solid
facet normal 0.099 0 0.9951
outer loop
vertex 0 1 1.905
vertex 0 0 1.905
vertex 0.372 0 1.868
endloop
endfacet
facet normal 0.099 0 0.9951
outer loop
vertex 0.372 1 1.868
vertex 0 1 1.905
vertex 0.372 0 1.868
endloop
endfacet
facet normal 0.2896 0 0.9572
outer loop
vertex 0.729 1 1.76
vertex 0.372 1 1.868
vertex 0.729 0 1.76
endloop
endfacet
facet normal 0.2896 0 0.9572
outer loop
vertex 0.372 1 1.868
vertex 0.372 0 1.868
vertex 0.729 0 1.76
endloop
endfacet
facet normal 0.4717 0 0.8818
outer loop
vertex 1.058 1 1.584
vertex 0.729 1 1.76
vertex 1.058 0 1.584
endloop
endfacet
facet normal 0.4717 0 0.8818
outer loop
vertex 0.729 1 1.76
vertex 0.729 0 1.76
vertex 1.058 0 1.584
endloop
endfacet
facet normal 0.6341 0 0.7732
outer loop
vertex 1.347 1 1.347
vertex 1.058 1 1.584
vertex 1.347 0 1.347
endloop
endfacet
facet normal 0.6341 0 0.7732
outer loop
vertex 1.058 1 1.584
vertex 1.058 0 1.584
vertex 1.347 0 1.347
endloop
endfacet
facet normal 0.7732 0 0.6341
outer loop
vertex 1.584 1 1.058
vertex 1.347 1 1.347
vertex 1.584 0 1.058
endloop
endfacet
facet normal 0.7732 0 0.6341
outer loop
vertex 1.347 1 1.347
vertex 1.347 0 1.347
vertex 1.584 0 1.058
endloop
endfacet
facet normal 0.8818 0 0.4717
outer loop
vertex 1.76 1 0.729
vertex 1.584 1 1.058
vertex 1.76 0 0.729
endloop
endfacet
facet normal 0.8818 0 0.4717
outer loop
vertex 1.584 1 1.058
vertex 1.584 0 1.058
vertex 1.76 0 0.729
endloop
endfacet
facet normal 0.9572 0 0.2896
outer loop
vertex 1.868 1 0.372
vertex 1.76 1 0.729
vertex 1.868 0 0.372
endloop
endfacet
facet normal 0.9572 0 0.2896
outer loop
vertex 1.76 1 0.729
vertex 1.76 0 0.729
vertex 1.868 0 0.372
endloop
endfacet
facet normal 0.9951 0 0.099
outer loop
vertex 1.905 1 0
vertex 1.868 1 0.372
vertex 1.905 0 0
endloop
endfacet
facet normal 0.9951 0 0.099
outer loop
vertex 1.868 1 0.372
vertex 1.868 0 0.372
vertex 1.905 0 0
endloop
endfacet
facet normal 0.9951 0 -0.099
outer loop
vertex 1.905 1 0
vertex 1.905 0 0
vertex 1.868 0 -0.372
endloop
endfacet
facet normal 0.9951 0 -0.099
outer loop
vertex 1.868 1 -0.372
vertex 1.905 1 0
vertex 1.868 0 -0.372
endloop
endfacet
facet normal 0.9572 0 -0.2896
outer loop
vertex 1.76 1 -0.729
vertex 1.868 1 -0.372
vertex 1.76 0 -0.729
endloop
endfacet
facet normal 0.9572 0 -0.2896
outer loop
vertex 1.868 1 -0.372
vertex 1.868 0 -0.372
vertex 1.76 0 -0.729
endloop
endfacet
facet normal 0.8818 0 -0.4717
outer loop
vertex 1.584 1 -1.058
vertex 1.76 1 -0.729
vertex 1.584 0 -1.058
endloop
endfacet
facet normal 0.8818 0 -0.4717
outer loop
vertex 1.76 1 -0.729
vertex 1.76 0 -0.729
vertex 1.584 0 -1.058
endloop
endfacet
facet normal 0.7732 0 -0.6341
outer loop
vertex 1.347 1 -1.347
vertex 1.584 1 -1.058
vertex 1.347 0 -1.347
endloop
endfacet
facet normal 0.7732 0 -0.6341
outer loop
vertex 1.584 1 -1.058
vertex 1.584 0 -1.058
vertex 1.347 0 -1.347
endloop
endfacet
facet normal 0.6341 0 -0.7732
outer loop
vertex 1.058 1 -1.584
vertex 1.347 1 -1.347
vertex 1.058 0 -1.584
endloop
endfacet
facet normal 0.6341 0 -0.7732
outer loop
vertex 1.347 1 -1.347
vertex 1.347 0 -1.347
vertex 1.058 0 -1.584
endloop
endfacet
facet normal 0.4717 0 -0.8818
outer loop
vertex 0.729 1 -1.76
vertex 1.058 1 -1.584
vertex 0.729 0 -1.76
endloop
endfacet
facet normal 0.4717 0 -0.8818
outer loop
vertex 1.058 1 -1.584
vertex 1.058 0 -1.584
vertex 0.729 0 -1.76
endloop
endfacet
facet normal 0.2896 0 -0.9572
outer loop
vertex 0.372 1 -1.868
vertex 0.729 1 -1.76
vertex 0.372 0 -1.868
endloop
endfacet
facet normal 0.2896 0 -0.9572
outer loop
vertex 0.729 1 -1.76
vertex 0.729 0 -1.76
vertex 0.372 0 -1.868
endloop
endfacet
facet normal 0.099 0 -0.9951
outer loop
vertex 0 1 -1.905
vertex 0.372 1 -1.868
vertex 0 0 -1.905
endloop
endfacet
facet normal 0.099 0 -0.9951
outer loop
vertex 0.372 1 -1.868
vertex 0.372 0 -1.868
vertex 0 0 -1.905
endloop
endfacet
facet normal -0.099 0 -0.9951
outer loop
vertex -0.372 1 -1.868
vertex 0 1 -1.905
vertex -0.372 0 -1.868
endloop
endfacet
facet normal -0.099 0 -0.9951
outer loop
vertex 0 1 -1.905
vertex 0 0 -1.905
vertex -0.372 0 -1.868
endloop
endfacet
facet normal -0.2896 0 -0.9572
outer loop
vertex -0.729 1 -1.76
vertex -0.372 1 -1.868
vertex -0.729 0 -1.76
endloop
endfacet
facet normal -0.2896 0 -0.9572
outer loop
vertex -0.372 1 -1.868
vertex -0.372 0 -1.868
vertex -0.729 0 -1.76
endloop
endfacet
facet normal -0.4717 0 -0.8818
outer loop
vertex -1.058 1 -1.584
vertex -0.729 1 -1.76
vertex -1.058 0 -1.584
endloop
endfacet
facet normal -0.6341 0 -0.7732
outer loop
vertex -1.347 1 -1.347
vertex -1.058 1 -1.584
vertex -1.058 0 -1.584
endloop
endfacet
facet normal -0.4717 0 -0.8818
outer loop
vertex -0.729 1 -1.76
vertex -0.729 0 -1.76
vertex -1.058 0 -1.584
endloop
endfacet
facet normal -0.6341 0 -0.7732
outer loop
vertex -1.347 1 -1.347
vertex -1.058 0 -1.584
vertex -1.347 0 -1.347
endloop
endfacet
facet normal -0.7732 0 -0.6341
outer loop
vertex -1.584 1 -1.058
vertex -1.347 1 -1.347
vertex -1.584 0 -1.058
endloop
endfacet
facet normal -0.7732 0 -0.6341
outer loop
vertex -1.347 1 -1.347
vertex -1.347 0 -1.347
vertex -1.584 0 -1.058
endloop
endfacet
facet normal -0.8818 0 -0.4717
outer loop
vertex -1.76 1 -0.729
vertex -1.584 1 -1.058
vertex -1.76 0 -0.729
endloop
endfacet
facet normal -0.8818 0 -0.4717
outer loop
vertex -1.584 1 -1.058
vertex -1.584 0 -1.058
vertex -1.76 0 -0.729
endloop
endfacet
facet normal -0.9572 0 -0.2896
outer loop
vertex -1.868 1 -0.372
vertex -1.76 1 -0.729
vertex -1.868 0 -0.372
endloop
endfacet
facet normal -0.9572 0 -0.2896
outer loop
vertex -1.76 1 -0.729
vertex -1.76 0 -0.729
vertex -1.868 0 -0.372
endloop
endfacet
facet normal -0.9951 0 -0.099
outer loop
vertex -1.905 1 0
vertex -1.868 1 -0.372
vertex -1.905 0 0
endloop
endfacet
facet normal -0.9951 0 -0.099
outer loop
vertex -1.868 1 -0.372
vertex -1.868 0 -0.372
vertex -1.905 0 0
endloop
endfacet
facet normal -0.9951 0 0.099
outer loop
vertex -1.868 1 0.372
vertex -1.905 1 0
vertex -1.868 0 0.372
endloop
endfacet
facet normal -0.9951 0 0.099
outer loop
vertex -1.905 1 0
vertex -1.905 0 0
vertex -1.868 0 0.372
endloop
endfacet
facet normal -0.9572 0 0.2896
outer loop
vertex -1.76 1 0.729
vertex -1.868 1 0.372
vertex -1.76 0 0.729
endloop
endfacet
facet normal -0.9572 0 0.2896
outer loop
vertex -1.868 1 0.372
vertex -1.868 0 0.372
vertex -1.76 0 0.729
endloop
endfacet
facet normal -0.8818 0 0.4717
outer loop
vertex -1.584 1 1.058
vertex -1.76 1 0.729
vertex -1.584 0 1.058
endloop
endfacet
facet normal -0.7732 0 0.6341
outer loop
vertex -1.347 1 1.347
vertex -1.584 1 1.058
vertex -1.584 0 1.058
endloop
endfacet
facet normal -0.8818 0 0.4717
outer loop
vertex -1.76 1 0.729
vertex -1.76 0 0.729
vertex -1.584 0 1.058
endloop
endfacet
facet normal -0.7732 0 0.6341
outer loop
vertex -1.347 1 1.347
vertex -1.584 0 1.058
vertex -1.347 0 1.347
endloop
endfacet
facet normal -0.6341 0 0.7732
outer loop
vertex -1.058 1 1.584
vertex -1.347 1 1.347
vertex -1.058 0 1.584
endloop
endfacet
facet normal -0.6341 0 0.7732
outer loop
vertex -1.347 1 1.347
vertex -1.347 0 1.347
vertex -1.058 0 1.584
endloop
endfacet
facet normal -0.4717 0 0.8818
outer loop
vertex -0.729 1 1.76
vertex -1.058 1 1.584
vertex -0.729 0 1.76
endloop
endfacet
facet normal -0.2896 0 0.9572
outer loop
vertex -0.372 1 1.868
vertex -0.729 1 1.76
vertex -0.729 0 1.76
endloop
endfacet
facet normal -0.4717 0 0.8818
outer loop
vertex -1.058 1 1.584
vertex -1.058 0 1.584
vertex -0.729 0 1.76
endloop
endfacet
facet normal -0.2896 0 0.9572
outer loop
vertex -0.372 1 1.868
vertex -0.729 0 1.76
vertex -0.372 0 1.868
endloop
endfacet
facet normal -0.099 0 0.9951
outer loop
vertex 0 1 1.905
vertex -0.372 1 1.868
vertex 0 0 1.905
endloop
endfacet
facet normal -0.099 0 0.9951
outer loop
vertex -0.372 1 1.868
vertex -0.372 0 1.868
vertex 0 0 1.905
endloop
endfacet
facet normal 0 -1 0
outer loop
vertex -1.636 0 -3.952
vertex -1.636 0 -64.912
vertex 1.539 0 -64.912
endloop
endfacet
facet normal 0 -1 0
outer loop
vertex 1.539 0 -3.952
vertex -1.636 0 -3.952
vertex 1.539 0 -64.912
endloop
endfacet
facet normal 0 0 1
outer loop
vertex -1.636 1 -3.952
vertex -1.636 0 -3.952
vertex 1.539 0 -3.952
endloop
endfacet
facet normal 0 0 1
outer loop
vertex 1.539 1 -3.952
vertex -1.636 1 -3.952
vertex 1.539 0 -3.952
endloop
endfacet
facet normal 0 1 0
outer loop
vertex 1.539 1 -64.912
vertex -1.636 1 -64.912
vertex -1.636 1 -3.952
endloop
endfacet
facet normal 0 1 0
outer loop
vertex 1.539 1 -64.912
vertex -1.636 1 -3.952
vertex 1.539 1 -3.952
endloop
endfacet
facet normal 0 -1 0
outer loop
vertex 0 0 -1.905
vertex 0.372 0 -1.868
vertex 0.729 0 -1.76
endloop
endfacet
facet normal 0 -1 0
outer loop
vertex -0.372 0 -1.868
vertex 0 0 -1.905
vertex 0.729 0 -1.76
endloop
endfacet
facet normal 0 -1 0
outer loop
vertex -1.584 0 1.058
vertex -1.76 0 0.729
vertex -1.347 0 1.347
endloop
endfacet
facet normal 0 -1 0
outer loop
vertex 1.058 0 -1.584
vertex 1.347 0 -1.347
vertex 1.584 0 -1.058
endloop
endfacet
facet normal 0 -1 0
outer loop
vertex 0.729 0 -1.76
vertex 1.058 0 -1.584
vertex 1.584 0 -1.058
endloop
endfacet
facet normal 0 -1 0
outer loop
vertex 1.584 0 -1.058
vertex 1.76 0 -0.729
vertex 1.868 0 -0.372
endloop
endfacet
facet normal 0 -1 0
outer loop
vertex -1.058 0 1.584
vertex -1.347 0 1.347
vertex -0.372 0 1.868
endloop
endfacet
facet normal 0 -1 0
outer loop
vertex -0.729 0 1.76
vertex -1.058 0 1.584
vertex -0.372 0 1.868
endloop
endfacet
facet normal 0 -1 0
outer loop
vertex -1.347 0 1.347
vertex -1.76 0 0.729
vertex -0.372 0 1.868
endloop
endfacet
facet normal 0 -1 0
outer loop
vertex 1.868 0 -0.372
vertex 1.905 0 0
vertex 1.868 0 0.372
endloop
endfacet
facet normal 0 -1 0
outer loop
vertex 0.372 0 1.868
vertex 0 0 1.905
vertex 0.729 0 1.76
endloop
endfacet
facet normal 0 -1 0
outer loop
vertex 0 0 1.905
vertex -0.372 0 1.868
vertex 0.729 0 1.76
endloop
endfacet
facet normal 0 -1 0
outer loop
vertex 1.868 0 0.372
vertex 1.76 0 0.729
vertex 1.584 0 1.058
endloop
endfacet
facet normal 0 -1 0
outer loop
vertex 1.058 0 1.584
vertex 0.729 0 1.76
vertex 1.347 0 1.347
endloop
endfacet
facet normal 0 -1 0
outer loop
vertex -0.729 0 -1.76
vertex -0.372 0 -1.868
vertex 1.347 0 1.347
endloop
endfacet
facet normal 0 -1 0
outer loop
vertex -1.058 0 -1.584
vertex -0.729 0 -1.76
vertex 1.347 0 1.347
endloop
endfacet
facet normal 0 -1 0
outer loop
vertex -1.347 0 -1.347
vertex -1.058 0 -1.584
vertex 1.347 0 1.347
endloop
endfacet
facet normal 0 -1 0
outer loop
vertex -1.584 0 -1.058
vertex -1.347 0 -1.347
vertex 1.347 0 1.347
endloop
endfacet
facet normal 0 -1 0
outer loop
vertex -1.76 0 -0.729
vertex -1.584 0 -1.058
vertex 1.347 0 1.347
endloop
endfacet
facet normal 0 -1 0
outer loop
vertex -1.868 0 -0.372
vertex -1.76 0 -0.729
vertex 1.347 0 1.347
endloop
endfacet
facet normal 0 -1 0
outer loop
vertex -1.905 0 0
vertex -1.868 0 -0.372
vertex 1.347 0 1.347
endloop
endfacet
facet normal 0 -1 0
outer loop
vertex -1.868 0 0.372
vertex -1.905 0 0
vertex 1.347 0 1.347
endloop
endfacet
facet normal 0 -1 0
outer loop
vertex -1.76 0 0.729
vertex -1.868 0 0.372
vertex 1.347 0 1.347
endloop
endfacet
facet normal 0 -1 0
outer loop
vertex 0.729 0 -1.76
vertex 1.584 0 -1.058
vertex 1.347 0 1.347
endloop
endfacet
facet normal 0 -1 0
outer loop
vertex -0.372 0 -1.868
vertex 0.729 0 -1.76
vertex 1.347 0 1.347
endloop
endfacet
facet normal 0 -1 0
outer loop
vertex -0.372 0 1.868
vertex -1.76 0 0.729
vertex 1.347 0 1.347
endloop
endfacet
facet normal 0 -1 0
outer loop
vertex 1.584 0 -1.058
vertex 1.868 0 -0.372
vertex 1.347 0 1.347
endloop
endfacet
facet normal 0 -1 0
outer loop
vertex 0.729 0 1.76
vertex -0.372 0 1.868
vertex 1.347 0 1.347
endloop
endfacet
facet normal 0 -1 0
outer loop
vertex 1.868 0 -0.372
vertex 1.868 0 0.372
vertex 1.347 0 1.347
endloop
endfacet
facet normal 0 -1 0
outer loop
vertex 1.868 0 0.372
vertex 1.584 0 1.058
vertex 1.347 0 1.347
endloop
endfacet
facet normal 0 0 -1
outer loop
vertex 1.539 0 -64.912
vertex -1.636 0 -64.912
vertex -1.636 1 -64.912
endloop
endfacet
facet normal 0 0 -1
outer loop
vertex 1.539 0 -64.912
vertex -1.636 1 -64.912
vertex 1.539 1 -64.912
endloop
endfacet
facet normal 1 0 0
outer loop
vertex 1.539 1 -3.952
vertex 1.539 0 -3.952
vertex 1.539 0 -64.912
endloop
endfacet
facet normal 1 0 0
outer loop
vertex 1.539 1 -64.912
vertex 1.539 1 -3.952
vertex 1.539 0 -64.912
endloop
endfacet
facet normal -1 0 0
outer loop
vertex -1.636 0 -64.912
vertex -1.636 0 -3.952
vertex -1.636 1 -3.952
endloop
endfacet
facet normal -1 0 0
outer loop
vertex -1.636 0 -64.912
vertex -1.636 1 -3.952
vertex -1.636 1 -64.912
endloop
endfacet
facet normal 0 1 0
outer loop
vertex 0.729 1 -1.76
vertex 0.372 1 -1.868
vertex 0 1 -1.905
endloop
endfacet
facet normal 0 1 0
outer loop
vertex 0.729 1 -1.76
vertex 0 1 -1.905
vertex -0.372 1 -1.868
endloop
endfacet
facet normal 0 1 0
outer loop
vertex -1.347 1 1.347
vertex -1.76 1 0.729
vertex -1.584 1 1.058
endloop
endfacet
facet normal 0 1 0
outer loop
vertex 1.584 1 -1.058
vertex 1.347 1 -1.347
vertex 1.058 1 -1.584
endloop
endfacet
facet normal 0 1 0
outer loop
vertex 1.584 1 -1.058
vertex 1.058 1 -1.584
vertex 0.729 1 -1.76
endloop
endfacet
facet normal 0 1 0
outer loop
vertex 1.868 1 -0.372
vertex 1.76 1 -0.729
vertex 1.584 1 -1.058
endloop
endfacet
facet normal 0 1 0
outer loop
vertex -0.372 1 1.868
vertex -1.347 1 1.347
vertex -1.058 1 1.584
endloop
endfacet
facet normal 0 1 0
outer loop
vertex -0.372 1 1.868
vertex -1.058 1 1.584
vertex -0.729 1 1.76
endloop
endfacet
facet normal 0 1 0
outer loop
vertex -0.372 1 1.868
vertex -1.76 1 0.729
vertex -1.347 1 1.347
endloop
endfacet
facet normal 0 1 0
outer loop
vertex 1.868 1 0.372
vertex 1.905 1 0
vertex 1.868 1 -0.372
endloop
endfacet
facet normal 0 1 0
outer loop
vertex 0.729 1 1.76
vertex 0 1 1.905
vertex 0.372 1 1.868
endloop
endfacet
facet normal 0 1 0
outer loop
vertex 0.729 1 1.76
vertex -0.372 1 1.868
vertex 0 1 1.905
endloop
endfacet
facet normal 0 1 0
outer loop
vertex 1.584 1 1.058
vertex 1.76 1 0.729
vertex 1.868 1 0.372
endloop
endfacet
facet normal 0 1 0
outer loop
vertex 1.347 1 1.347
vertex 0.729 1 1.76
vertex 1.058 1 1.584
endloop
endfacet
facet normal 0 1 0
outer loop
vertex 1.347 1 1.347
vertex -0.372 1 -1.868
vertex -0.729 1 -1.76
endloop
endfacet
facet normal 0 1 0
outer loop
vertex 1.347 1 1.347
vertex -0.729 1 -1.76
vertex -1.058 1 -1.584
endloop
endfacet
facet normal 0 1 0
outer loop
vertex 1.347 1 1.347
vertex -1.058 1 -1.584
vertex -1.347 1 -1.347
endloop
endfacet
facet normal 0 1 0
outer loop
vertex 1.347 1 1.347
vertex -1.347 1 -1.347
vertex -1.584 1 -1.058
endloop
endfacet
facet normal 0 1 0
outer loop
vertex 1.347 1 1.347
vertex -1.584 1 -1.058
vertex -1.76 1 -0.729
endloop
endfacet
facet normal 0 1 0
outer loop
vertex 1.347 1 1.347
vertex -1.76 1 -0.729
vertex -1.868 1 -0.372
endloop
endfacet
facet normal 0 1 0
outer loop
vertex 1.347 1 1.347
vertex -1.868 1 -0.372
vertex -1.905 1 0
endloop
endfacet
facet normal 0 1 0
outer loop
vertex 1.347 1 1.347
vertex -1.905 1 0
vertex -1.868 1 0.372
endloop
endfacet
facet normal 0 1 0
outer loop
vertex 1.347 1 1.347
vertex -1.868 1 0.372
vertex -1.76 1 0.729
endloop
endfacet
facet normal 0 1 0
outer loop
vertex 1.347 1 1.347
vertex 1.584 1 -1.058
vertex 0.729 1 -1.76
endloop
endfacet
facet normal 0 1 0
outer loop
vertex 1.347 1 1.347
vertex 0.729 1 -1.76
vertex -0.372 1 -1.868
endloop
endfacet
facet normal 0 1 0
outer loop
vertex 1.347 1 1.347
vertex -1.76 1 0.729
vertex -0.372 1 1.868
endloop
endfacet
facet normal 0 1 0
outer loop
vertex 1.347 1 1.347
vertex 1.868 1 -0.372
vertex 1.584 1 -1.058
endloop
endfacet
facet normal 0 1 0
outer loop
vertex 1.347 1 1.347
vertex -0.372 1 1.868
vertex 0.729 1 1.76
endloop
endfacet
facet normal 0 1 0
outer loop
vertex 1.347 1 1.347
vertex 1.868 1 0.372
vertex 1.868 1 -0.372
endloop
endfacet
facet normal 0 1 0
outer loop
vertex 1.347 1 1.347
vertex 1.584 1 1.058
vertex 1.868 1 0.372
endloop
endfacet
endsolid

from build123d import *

# Parameters (mm, degrees)
SKETCH1_R           = 1.905
BOSS_EXTRUDE1_DEPTH = 1
SKETCH2_W           = 3.175
SKETCH2_H           = 60.96
BOSS_EXTRUDE2_DEPTH = 1


with BuildPart() as part:
    # Sketch1 → Boss-Extrude1 (new body)
    with BuildSketch(Plane(origin=(0, 0, 0), x_dir=(1, 0, 0), z_dir=(0, 1, 0))):
        with Locations(Location((0, 0, 0), (0, 0, 270))):
            Circle(SKETCH1_R)
    extrude(amount=BOSS_EXTRUDE1_DEPTH)


with BuildPart() as body_2:
    # Sketch2 → Boss-Extrude2 (new body)
    with BuildSketch(Plane(origin=(0, 0, 0), x_dir=(1, 0, 0), z_dir=(0, 1, 0))):
        with Locations((-0.048166493, 34.431945888)):
            Rectangle(SKETCH2_W, SKETCH2_H)
    extrude(amount=BOSS_EXTRUDE2_DEPTH)


solid = Compound([part.part, body_2.part])
